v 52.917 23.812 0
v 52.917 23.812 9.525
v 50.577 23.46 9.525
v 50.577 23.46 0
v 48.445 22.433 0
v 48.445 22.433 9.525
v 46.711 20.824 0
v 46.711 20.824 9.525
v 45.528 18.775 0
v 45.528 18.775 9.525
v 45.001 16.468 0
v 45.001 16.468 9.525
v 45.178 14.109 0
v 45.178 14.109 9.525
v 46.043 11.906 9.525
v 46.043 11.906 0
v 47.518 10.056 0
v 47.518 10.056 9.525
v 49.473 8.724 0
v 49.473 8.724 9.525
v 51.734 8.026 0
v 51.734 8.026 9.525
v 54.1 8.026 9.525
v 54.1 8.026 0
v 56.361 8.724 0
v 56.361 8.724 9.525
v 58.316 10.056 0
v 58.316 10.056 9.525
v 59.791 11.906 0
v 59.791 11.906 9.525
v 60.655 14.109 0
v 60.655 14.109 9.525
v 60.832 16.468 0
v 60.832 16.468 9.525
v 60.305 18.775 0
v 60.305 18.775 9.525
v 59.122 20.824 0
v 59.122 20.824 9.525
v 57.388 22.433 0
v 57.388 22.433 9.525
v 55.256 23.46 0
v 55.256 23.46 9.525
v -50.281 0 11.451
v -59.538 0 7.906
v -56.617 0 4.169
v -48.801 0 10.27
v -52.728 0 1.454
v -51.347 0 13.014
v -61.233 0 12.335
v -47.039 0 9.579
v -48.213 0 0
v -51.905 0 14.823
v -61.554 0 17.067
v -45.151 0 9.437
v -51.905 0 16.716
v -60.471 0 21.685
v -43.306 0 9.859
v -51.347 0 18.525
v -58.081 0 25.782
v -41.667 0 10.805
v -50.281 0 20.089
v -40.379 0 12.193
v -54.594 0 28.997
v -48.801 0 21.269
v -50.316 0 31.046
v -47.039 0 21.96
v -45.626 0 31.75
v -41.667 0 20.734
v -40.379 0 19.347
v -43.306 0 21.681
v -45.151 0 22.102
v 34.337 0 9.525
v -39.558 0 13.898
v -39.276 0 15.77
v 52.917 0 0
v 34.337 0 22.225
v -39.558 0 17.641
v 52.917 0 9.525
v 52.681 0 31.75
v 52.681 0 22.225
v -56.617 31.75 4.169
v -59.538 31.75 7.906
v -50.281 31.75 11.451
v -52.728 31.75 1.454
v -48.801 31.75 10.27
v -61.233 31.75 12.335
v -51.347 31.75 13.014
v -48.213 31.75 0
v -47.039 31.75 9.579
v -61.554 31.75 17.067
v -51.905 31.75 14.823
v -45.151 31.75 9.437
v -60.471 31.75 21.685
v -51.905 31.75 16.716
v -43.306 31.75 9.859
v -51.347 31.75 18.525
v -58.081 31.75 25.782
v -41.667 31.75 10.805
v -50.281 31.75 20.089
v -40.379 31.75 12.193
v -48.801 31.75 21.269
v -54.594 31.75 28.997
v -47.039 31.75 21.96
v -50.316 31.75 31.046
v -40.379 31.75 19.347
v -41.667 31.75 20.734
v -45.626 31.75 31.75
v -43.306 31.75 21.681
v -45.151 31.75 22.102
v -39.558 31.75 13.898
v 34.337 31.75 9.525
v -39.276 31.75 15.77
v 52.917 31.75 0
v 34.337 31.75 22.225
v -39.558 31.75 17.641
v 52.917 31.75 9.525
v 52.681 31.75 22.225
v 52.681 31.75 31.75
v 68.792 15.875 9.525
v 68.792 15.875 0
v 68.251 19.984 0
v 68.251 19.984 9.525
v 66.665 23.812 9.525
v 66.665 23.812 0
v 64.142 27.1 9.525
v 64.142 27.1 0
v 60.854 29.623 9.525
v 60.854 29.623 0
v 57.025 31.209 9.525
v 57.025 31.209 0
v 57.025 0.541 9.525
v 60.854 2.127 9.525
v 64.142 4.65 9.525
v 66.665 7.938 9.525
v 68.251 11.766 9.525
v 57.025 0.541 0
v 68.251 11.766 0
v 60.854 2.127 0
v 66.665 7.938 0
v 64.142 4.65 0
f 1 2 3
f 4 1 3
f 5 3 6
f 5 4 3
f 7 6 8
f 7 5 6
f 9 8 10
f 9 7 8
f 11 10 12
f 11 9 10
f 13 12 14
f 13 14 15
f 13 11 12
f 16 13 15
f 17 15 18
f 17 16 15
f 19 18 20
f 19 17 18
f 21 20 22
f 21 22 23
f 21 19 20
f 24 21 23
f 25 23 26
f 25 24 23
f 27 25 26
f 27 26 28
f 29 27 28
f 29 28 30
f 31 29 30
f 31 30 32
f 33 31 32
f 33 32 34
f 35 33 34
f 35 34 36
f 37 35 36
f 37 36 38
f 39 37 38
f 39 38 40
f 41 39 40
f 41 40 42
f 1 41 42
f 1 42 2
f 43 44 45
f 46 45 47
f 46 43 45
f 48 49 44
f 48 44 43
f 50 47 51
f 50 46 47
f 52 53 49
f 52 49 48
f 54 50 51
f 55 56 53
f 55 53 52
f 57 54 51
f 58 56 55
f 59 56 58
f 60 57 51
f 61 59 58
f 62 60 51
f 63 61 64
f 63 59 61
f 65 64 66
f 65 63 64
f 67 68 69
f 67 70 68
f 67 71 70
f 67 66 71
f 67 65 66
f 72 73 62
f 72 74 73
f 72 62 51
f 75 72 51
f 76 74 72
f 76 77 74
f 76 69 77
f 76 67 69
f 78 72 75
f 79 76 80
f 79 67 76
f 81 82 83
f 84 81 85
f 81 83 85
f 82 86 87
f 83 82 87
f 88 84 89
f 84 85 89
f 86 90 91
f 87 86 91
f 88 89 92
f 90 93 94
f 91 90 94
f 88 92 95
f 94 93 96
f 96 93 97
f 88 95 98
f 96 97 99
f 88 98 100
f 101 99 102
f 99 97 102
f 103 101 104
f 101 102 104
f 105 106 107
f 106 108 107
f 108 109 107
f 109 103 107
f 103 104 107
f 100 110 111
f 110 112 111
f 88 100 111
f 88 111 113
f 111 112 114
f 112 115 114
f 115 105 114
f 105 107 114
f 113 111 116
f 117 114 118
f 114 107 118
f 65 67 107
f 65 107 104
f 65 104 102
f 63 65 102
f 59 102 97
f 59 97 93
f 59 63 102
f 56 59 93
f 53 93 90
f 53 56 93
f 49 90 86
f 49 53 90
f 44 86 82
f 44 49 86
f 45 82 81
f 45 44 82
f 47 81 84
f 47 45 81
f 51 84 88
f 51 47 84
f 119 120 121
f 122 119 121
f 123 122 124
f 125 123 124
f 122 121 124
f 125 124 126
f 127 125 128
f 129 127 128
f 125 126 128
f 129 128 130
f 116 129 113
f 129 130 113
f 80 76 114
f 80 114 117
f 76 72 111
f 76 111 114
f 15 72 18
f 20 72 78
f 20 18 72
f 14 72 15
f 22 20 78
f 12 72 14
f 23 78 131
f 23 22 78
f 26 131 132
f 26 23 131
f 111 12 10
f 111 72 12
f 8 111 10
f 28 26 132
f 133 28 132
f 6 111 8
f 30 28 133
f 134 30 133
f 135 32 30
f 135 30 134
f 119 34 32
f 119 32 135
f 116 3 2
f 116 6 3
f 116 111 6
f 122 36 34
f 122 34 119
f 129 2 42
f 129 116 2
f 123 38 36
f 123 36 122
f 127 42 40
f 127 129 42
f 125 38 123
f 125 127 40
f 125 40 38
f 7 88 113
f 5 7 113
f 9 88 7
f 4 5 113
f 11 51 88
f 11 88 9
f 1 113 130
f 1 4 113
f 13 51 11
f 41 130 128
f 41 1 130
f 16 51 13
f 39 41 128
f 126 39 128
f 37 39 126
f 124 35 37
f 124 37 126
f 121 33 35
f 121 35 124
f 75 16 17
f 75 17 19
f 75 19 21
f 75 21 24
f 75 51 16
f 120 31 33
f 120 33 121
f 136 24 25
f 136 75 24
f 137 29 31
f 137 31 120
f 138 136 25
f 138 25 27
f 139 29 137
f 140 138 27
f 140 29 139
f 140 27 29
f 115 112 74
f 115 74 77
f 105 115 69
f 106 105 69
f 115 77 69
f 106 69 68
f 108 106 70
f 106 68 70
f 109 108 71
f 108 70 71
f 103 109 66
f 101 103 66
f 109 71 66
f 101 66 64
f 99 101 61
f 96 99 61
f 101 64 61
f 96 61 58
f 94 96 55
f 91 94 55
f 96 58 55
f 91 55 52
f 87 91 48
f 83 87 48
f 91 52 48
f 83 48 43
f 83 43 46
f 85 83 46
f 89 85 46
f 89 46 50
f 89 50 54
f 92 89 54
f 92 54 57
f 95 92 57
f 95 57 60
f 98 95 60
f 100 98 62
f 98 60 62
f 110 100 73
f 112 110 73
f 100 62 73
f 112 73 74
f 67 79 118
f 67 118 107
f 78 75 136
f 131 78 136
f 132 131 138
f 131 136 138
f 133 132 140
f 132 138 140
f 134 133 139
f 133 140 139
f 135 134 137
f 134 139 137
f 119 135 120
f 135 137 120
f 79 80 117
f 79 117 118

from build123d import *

# Parameters (mm, degrees)
F0_R     = 6.35
F1_DEPTH = 31.75
F2_R     = 7.9375
F3_DEPTH = 9.525
F4_DEPTH = 9.525


with BuildPart() as f1:
    # F0 (on Front) → F1 (new body)
    with BuildSketch(Plane.XZ):
        with BuildLine():
            ThreePointArc((-45.625926, 31.75), (-61.553538, 17.067408), (-48.212963, 0))
            Line((-48.212963, 0), (52.916662, 0))
            Line((52.916662, 0), (52.916662, 9.525))
            Line((52.916662, 9.525), (34.337035, 9.525))
            Line((34.337035, 9.525), (34.337035, 22.225))
            Line((34.337035, 22.225), (52.681481, 22.225))
            Line((52.681481, 22.225), (52.681481, 31.75))
            Line((52.681481, 31.75), (-45.625926, 31.75))
        make_face()
        with Locations((-45.625926, 15.769602)):
            Circle(F0_R, mode=Mode.SUBTRACT)
    extrude(amount=-F1_DEPTH)

    # F2 (on Top) → F3 (join, through all)
    with BuildSketch(Plane.XY):
        with BuildLine():
            ThreePointArc((52.916662, 31.75), (37.041662, 15.875), (52.916662, 0))
            ThreePointArc((52.916662, 0), (64.141982, 4.64968), (68.791662, 15.875))
            ThreePointArc((68.791662, 15.875), (64.141982, 27.10032), (52.916662, 31.75))
        make_face()
        with Locations((52.916662, 15.875)):
            Circle(F2_R, mode=Mode.SUBTRACT)
    extrude(amount=F3_DEPTH)

    # F2 (on Top) → F4 (cut, through all)
    with BuildSketch(Plane.XY):
        with Locations((52.916662, 15.875)):
            Circle(F2_R)
    extrude(amount=F4_DEPTH, mode=Mode.SUBTRACT)


solid = f1.part
